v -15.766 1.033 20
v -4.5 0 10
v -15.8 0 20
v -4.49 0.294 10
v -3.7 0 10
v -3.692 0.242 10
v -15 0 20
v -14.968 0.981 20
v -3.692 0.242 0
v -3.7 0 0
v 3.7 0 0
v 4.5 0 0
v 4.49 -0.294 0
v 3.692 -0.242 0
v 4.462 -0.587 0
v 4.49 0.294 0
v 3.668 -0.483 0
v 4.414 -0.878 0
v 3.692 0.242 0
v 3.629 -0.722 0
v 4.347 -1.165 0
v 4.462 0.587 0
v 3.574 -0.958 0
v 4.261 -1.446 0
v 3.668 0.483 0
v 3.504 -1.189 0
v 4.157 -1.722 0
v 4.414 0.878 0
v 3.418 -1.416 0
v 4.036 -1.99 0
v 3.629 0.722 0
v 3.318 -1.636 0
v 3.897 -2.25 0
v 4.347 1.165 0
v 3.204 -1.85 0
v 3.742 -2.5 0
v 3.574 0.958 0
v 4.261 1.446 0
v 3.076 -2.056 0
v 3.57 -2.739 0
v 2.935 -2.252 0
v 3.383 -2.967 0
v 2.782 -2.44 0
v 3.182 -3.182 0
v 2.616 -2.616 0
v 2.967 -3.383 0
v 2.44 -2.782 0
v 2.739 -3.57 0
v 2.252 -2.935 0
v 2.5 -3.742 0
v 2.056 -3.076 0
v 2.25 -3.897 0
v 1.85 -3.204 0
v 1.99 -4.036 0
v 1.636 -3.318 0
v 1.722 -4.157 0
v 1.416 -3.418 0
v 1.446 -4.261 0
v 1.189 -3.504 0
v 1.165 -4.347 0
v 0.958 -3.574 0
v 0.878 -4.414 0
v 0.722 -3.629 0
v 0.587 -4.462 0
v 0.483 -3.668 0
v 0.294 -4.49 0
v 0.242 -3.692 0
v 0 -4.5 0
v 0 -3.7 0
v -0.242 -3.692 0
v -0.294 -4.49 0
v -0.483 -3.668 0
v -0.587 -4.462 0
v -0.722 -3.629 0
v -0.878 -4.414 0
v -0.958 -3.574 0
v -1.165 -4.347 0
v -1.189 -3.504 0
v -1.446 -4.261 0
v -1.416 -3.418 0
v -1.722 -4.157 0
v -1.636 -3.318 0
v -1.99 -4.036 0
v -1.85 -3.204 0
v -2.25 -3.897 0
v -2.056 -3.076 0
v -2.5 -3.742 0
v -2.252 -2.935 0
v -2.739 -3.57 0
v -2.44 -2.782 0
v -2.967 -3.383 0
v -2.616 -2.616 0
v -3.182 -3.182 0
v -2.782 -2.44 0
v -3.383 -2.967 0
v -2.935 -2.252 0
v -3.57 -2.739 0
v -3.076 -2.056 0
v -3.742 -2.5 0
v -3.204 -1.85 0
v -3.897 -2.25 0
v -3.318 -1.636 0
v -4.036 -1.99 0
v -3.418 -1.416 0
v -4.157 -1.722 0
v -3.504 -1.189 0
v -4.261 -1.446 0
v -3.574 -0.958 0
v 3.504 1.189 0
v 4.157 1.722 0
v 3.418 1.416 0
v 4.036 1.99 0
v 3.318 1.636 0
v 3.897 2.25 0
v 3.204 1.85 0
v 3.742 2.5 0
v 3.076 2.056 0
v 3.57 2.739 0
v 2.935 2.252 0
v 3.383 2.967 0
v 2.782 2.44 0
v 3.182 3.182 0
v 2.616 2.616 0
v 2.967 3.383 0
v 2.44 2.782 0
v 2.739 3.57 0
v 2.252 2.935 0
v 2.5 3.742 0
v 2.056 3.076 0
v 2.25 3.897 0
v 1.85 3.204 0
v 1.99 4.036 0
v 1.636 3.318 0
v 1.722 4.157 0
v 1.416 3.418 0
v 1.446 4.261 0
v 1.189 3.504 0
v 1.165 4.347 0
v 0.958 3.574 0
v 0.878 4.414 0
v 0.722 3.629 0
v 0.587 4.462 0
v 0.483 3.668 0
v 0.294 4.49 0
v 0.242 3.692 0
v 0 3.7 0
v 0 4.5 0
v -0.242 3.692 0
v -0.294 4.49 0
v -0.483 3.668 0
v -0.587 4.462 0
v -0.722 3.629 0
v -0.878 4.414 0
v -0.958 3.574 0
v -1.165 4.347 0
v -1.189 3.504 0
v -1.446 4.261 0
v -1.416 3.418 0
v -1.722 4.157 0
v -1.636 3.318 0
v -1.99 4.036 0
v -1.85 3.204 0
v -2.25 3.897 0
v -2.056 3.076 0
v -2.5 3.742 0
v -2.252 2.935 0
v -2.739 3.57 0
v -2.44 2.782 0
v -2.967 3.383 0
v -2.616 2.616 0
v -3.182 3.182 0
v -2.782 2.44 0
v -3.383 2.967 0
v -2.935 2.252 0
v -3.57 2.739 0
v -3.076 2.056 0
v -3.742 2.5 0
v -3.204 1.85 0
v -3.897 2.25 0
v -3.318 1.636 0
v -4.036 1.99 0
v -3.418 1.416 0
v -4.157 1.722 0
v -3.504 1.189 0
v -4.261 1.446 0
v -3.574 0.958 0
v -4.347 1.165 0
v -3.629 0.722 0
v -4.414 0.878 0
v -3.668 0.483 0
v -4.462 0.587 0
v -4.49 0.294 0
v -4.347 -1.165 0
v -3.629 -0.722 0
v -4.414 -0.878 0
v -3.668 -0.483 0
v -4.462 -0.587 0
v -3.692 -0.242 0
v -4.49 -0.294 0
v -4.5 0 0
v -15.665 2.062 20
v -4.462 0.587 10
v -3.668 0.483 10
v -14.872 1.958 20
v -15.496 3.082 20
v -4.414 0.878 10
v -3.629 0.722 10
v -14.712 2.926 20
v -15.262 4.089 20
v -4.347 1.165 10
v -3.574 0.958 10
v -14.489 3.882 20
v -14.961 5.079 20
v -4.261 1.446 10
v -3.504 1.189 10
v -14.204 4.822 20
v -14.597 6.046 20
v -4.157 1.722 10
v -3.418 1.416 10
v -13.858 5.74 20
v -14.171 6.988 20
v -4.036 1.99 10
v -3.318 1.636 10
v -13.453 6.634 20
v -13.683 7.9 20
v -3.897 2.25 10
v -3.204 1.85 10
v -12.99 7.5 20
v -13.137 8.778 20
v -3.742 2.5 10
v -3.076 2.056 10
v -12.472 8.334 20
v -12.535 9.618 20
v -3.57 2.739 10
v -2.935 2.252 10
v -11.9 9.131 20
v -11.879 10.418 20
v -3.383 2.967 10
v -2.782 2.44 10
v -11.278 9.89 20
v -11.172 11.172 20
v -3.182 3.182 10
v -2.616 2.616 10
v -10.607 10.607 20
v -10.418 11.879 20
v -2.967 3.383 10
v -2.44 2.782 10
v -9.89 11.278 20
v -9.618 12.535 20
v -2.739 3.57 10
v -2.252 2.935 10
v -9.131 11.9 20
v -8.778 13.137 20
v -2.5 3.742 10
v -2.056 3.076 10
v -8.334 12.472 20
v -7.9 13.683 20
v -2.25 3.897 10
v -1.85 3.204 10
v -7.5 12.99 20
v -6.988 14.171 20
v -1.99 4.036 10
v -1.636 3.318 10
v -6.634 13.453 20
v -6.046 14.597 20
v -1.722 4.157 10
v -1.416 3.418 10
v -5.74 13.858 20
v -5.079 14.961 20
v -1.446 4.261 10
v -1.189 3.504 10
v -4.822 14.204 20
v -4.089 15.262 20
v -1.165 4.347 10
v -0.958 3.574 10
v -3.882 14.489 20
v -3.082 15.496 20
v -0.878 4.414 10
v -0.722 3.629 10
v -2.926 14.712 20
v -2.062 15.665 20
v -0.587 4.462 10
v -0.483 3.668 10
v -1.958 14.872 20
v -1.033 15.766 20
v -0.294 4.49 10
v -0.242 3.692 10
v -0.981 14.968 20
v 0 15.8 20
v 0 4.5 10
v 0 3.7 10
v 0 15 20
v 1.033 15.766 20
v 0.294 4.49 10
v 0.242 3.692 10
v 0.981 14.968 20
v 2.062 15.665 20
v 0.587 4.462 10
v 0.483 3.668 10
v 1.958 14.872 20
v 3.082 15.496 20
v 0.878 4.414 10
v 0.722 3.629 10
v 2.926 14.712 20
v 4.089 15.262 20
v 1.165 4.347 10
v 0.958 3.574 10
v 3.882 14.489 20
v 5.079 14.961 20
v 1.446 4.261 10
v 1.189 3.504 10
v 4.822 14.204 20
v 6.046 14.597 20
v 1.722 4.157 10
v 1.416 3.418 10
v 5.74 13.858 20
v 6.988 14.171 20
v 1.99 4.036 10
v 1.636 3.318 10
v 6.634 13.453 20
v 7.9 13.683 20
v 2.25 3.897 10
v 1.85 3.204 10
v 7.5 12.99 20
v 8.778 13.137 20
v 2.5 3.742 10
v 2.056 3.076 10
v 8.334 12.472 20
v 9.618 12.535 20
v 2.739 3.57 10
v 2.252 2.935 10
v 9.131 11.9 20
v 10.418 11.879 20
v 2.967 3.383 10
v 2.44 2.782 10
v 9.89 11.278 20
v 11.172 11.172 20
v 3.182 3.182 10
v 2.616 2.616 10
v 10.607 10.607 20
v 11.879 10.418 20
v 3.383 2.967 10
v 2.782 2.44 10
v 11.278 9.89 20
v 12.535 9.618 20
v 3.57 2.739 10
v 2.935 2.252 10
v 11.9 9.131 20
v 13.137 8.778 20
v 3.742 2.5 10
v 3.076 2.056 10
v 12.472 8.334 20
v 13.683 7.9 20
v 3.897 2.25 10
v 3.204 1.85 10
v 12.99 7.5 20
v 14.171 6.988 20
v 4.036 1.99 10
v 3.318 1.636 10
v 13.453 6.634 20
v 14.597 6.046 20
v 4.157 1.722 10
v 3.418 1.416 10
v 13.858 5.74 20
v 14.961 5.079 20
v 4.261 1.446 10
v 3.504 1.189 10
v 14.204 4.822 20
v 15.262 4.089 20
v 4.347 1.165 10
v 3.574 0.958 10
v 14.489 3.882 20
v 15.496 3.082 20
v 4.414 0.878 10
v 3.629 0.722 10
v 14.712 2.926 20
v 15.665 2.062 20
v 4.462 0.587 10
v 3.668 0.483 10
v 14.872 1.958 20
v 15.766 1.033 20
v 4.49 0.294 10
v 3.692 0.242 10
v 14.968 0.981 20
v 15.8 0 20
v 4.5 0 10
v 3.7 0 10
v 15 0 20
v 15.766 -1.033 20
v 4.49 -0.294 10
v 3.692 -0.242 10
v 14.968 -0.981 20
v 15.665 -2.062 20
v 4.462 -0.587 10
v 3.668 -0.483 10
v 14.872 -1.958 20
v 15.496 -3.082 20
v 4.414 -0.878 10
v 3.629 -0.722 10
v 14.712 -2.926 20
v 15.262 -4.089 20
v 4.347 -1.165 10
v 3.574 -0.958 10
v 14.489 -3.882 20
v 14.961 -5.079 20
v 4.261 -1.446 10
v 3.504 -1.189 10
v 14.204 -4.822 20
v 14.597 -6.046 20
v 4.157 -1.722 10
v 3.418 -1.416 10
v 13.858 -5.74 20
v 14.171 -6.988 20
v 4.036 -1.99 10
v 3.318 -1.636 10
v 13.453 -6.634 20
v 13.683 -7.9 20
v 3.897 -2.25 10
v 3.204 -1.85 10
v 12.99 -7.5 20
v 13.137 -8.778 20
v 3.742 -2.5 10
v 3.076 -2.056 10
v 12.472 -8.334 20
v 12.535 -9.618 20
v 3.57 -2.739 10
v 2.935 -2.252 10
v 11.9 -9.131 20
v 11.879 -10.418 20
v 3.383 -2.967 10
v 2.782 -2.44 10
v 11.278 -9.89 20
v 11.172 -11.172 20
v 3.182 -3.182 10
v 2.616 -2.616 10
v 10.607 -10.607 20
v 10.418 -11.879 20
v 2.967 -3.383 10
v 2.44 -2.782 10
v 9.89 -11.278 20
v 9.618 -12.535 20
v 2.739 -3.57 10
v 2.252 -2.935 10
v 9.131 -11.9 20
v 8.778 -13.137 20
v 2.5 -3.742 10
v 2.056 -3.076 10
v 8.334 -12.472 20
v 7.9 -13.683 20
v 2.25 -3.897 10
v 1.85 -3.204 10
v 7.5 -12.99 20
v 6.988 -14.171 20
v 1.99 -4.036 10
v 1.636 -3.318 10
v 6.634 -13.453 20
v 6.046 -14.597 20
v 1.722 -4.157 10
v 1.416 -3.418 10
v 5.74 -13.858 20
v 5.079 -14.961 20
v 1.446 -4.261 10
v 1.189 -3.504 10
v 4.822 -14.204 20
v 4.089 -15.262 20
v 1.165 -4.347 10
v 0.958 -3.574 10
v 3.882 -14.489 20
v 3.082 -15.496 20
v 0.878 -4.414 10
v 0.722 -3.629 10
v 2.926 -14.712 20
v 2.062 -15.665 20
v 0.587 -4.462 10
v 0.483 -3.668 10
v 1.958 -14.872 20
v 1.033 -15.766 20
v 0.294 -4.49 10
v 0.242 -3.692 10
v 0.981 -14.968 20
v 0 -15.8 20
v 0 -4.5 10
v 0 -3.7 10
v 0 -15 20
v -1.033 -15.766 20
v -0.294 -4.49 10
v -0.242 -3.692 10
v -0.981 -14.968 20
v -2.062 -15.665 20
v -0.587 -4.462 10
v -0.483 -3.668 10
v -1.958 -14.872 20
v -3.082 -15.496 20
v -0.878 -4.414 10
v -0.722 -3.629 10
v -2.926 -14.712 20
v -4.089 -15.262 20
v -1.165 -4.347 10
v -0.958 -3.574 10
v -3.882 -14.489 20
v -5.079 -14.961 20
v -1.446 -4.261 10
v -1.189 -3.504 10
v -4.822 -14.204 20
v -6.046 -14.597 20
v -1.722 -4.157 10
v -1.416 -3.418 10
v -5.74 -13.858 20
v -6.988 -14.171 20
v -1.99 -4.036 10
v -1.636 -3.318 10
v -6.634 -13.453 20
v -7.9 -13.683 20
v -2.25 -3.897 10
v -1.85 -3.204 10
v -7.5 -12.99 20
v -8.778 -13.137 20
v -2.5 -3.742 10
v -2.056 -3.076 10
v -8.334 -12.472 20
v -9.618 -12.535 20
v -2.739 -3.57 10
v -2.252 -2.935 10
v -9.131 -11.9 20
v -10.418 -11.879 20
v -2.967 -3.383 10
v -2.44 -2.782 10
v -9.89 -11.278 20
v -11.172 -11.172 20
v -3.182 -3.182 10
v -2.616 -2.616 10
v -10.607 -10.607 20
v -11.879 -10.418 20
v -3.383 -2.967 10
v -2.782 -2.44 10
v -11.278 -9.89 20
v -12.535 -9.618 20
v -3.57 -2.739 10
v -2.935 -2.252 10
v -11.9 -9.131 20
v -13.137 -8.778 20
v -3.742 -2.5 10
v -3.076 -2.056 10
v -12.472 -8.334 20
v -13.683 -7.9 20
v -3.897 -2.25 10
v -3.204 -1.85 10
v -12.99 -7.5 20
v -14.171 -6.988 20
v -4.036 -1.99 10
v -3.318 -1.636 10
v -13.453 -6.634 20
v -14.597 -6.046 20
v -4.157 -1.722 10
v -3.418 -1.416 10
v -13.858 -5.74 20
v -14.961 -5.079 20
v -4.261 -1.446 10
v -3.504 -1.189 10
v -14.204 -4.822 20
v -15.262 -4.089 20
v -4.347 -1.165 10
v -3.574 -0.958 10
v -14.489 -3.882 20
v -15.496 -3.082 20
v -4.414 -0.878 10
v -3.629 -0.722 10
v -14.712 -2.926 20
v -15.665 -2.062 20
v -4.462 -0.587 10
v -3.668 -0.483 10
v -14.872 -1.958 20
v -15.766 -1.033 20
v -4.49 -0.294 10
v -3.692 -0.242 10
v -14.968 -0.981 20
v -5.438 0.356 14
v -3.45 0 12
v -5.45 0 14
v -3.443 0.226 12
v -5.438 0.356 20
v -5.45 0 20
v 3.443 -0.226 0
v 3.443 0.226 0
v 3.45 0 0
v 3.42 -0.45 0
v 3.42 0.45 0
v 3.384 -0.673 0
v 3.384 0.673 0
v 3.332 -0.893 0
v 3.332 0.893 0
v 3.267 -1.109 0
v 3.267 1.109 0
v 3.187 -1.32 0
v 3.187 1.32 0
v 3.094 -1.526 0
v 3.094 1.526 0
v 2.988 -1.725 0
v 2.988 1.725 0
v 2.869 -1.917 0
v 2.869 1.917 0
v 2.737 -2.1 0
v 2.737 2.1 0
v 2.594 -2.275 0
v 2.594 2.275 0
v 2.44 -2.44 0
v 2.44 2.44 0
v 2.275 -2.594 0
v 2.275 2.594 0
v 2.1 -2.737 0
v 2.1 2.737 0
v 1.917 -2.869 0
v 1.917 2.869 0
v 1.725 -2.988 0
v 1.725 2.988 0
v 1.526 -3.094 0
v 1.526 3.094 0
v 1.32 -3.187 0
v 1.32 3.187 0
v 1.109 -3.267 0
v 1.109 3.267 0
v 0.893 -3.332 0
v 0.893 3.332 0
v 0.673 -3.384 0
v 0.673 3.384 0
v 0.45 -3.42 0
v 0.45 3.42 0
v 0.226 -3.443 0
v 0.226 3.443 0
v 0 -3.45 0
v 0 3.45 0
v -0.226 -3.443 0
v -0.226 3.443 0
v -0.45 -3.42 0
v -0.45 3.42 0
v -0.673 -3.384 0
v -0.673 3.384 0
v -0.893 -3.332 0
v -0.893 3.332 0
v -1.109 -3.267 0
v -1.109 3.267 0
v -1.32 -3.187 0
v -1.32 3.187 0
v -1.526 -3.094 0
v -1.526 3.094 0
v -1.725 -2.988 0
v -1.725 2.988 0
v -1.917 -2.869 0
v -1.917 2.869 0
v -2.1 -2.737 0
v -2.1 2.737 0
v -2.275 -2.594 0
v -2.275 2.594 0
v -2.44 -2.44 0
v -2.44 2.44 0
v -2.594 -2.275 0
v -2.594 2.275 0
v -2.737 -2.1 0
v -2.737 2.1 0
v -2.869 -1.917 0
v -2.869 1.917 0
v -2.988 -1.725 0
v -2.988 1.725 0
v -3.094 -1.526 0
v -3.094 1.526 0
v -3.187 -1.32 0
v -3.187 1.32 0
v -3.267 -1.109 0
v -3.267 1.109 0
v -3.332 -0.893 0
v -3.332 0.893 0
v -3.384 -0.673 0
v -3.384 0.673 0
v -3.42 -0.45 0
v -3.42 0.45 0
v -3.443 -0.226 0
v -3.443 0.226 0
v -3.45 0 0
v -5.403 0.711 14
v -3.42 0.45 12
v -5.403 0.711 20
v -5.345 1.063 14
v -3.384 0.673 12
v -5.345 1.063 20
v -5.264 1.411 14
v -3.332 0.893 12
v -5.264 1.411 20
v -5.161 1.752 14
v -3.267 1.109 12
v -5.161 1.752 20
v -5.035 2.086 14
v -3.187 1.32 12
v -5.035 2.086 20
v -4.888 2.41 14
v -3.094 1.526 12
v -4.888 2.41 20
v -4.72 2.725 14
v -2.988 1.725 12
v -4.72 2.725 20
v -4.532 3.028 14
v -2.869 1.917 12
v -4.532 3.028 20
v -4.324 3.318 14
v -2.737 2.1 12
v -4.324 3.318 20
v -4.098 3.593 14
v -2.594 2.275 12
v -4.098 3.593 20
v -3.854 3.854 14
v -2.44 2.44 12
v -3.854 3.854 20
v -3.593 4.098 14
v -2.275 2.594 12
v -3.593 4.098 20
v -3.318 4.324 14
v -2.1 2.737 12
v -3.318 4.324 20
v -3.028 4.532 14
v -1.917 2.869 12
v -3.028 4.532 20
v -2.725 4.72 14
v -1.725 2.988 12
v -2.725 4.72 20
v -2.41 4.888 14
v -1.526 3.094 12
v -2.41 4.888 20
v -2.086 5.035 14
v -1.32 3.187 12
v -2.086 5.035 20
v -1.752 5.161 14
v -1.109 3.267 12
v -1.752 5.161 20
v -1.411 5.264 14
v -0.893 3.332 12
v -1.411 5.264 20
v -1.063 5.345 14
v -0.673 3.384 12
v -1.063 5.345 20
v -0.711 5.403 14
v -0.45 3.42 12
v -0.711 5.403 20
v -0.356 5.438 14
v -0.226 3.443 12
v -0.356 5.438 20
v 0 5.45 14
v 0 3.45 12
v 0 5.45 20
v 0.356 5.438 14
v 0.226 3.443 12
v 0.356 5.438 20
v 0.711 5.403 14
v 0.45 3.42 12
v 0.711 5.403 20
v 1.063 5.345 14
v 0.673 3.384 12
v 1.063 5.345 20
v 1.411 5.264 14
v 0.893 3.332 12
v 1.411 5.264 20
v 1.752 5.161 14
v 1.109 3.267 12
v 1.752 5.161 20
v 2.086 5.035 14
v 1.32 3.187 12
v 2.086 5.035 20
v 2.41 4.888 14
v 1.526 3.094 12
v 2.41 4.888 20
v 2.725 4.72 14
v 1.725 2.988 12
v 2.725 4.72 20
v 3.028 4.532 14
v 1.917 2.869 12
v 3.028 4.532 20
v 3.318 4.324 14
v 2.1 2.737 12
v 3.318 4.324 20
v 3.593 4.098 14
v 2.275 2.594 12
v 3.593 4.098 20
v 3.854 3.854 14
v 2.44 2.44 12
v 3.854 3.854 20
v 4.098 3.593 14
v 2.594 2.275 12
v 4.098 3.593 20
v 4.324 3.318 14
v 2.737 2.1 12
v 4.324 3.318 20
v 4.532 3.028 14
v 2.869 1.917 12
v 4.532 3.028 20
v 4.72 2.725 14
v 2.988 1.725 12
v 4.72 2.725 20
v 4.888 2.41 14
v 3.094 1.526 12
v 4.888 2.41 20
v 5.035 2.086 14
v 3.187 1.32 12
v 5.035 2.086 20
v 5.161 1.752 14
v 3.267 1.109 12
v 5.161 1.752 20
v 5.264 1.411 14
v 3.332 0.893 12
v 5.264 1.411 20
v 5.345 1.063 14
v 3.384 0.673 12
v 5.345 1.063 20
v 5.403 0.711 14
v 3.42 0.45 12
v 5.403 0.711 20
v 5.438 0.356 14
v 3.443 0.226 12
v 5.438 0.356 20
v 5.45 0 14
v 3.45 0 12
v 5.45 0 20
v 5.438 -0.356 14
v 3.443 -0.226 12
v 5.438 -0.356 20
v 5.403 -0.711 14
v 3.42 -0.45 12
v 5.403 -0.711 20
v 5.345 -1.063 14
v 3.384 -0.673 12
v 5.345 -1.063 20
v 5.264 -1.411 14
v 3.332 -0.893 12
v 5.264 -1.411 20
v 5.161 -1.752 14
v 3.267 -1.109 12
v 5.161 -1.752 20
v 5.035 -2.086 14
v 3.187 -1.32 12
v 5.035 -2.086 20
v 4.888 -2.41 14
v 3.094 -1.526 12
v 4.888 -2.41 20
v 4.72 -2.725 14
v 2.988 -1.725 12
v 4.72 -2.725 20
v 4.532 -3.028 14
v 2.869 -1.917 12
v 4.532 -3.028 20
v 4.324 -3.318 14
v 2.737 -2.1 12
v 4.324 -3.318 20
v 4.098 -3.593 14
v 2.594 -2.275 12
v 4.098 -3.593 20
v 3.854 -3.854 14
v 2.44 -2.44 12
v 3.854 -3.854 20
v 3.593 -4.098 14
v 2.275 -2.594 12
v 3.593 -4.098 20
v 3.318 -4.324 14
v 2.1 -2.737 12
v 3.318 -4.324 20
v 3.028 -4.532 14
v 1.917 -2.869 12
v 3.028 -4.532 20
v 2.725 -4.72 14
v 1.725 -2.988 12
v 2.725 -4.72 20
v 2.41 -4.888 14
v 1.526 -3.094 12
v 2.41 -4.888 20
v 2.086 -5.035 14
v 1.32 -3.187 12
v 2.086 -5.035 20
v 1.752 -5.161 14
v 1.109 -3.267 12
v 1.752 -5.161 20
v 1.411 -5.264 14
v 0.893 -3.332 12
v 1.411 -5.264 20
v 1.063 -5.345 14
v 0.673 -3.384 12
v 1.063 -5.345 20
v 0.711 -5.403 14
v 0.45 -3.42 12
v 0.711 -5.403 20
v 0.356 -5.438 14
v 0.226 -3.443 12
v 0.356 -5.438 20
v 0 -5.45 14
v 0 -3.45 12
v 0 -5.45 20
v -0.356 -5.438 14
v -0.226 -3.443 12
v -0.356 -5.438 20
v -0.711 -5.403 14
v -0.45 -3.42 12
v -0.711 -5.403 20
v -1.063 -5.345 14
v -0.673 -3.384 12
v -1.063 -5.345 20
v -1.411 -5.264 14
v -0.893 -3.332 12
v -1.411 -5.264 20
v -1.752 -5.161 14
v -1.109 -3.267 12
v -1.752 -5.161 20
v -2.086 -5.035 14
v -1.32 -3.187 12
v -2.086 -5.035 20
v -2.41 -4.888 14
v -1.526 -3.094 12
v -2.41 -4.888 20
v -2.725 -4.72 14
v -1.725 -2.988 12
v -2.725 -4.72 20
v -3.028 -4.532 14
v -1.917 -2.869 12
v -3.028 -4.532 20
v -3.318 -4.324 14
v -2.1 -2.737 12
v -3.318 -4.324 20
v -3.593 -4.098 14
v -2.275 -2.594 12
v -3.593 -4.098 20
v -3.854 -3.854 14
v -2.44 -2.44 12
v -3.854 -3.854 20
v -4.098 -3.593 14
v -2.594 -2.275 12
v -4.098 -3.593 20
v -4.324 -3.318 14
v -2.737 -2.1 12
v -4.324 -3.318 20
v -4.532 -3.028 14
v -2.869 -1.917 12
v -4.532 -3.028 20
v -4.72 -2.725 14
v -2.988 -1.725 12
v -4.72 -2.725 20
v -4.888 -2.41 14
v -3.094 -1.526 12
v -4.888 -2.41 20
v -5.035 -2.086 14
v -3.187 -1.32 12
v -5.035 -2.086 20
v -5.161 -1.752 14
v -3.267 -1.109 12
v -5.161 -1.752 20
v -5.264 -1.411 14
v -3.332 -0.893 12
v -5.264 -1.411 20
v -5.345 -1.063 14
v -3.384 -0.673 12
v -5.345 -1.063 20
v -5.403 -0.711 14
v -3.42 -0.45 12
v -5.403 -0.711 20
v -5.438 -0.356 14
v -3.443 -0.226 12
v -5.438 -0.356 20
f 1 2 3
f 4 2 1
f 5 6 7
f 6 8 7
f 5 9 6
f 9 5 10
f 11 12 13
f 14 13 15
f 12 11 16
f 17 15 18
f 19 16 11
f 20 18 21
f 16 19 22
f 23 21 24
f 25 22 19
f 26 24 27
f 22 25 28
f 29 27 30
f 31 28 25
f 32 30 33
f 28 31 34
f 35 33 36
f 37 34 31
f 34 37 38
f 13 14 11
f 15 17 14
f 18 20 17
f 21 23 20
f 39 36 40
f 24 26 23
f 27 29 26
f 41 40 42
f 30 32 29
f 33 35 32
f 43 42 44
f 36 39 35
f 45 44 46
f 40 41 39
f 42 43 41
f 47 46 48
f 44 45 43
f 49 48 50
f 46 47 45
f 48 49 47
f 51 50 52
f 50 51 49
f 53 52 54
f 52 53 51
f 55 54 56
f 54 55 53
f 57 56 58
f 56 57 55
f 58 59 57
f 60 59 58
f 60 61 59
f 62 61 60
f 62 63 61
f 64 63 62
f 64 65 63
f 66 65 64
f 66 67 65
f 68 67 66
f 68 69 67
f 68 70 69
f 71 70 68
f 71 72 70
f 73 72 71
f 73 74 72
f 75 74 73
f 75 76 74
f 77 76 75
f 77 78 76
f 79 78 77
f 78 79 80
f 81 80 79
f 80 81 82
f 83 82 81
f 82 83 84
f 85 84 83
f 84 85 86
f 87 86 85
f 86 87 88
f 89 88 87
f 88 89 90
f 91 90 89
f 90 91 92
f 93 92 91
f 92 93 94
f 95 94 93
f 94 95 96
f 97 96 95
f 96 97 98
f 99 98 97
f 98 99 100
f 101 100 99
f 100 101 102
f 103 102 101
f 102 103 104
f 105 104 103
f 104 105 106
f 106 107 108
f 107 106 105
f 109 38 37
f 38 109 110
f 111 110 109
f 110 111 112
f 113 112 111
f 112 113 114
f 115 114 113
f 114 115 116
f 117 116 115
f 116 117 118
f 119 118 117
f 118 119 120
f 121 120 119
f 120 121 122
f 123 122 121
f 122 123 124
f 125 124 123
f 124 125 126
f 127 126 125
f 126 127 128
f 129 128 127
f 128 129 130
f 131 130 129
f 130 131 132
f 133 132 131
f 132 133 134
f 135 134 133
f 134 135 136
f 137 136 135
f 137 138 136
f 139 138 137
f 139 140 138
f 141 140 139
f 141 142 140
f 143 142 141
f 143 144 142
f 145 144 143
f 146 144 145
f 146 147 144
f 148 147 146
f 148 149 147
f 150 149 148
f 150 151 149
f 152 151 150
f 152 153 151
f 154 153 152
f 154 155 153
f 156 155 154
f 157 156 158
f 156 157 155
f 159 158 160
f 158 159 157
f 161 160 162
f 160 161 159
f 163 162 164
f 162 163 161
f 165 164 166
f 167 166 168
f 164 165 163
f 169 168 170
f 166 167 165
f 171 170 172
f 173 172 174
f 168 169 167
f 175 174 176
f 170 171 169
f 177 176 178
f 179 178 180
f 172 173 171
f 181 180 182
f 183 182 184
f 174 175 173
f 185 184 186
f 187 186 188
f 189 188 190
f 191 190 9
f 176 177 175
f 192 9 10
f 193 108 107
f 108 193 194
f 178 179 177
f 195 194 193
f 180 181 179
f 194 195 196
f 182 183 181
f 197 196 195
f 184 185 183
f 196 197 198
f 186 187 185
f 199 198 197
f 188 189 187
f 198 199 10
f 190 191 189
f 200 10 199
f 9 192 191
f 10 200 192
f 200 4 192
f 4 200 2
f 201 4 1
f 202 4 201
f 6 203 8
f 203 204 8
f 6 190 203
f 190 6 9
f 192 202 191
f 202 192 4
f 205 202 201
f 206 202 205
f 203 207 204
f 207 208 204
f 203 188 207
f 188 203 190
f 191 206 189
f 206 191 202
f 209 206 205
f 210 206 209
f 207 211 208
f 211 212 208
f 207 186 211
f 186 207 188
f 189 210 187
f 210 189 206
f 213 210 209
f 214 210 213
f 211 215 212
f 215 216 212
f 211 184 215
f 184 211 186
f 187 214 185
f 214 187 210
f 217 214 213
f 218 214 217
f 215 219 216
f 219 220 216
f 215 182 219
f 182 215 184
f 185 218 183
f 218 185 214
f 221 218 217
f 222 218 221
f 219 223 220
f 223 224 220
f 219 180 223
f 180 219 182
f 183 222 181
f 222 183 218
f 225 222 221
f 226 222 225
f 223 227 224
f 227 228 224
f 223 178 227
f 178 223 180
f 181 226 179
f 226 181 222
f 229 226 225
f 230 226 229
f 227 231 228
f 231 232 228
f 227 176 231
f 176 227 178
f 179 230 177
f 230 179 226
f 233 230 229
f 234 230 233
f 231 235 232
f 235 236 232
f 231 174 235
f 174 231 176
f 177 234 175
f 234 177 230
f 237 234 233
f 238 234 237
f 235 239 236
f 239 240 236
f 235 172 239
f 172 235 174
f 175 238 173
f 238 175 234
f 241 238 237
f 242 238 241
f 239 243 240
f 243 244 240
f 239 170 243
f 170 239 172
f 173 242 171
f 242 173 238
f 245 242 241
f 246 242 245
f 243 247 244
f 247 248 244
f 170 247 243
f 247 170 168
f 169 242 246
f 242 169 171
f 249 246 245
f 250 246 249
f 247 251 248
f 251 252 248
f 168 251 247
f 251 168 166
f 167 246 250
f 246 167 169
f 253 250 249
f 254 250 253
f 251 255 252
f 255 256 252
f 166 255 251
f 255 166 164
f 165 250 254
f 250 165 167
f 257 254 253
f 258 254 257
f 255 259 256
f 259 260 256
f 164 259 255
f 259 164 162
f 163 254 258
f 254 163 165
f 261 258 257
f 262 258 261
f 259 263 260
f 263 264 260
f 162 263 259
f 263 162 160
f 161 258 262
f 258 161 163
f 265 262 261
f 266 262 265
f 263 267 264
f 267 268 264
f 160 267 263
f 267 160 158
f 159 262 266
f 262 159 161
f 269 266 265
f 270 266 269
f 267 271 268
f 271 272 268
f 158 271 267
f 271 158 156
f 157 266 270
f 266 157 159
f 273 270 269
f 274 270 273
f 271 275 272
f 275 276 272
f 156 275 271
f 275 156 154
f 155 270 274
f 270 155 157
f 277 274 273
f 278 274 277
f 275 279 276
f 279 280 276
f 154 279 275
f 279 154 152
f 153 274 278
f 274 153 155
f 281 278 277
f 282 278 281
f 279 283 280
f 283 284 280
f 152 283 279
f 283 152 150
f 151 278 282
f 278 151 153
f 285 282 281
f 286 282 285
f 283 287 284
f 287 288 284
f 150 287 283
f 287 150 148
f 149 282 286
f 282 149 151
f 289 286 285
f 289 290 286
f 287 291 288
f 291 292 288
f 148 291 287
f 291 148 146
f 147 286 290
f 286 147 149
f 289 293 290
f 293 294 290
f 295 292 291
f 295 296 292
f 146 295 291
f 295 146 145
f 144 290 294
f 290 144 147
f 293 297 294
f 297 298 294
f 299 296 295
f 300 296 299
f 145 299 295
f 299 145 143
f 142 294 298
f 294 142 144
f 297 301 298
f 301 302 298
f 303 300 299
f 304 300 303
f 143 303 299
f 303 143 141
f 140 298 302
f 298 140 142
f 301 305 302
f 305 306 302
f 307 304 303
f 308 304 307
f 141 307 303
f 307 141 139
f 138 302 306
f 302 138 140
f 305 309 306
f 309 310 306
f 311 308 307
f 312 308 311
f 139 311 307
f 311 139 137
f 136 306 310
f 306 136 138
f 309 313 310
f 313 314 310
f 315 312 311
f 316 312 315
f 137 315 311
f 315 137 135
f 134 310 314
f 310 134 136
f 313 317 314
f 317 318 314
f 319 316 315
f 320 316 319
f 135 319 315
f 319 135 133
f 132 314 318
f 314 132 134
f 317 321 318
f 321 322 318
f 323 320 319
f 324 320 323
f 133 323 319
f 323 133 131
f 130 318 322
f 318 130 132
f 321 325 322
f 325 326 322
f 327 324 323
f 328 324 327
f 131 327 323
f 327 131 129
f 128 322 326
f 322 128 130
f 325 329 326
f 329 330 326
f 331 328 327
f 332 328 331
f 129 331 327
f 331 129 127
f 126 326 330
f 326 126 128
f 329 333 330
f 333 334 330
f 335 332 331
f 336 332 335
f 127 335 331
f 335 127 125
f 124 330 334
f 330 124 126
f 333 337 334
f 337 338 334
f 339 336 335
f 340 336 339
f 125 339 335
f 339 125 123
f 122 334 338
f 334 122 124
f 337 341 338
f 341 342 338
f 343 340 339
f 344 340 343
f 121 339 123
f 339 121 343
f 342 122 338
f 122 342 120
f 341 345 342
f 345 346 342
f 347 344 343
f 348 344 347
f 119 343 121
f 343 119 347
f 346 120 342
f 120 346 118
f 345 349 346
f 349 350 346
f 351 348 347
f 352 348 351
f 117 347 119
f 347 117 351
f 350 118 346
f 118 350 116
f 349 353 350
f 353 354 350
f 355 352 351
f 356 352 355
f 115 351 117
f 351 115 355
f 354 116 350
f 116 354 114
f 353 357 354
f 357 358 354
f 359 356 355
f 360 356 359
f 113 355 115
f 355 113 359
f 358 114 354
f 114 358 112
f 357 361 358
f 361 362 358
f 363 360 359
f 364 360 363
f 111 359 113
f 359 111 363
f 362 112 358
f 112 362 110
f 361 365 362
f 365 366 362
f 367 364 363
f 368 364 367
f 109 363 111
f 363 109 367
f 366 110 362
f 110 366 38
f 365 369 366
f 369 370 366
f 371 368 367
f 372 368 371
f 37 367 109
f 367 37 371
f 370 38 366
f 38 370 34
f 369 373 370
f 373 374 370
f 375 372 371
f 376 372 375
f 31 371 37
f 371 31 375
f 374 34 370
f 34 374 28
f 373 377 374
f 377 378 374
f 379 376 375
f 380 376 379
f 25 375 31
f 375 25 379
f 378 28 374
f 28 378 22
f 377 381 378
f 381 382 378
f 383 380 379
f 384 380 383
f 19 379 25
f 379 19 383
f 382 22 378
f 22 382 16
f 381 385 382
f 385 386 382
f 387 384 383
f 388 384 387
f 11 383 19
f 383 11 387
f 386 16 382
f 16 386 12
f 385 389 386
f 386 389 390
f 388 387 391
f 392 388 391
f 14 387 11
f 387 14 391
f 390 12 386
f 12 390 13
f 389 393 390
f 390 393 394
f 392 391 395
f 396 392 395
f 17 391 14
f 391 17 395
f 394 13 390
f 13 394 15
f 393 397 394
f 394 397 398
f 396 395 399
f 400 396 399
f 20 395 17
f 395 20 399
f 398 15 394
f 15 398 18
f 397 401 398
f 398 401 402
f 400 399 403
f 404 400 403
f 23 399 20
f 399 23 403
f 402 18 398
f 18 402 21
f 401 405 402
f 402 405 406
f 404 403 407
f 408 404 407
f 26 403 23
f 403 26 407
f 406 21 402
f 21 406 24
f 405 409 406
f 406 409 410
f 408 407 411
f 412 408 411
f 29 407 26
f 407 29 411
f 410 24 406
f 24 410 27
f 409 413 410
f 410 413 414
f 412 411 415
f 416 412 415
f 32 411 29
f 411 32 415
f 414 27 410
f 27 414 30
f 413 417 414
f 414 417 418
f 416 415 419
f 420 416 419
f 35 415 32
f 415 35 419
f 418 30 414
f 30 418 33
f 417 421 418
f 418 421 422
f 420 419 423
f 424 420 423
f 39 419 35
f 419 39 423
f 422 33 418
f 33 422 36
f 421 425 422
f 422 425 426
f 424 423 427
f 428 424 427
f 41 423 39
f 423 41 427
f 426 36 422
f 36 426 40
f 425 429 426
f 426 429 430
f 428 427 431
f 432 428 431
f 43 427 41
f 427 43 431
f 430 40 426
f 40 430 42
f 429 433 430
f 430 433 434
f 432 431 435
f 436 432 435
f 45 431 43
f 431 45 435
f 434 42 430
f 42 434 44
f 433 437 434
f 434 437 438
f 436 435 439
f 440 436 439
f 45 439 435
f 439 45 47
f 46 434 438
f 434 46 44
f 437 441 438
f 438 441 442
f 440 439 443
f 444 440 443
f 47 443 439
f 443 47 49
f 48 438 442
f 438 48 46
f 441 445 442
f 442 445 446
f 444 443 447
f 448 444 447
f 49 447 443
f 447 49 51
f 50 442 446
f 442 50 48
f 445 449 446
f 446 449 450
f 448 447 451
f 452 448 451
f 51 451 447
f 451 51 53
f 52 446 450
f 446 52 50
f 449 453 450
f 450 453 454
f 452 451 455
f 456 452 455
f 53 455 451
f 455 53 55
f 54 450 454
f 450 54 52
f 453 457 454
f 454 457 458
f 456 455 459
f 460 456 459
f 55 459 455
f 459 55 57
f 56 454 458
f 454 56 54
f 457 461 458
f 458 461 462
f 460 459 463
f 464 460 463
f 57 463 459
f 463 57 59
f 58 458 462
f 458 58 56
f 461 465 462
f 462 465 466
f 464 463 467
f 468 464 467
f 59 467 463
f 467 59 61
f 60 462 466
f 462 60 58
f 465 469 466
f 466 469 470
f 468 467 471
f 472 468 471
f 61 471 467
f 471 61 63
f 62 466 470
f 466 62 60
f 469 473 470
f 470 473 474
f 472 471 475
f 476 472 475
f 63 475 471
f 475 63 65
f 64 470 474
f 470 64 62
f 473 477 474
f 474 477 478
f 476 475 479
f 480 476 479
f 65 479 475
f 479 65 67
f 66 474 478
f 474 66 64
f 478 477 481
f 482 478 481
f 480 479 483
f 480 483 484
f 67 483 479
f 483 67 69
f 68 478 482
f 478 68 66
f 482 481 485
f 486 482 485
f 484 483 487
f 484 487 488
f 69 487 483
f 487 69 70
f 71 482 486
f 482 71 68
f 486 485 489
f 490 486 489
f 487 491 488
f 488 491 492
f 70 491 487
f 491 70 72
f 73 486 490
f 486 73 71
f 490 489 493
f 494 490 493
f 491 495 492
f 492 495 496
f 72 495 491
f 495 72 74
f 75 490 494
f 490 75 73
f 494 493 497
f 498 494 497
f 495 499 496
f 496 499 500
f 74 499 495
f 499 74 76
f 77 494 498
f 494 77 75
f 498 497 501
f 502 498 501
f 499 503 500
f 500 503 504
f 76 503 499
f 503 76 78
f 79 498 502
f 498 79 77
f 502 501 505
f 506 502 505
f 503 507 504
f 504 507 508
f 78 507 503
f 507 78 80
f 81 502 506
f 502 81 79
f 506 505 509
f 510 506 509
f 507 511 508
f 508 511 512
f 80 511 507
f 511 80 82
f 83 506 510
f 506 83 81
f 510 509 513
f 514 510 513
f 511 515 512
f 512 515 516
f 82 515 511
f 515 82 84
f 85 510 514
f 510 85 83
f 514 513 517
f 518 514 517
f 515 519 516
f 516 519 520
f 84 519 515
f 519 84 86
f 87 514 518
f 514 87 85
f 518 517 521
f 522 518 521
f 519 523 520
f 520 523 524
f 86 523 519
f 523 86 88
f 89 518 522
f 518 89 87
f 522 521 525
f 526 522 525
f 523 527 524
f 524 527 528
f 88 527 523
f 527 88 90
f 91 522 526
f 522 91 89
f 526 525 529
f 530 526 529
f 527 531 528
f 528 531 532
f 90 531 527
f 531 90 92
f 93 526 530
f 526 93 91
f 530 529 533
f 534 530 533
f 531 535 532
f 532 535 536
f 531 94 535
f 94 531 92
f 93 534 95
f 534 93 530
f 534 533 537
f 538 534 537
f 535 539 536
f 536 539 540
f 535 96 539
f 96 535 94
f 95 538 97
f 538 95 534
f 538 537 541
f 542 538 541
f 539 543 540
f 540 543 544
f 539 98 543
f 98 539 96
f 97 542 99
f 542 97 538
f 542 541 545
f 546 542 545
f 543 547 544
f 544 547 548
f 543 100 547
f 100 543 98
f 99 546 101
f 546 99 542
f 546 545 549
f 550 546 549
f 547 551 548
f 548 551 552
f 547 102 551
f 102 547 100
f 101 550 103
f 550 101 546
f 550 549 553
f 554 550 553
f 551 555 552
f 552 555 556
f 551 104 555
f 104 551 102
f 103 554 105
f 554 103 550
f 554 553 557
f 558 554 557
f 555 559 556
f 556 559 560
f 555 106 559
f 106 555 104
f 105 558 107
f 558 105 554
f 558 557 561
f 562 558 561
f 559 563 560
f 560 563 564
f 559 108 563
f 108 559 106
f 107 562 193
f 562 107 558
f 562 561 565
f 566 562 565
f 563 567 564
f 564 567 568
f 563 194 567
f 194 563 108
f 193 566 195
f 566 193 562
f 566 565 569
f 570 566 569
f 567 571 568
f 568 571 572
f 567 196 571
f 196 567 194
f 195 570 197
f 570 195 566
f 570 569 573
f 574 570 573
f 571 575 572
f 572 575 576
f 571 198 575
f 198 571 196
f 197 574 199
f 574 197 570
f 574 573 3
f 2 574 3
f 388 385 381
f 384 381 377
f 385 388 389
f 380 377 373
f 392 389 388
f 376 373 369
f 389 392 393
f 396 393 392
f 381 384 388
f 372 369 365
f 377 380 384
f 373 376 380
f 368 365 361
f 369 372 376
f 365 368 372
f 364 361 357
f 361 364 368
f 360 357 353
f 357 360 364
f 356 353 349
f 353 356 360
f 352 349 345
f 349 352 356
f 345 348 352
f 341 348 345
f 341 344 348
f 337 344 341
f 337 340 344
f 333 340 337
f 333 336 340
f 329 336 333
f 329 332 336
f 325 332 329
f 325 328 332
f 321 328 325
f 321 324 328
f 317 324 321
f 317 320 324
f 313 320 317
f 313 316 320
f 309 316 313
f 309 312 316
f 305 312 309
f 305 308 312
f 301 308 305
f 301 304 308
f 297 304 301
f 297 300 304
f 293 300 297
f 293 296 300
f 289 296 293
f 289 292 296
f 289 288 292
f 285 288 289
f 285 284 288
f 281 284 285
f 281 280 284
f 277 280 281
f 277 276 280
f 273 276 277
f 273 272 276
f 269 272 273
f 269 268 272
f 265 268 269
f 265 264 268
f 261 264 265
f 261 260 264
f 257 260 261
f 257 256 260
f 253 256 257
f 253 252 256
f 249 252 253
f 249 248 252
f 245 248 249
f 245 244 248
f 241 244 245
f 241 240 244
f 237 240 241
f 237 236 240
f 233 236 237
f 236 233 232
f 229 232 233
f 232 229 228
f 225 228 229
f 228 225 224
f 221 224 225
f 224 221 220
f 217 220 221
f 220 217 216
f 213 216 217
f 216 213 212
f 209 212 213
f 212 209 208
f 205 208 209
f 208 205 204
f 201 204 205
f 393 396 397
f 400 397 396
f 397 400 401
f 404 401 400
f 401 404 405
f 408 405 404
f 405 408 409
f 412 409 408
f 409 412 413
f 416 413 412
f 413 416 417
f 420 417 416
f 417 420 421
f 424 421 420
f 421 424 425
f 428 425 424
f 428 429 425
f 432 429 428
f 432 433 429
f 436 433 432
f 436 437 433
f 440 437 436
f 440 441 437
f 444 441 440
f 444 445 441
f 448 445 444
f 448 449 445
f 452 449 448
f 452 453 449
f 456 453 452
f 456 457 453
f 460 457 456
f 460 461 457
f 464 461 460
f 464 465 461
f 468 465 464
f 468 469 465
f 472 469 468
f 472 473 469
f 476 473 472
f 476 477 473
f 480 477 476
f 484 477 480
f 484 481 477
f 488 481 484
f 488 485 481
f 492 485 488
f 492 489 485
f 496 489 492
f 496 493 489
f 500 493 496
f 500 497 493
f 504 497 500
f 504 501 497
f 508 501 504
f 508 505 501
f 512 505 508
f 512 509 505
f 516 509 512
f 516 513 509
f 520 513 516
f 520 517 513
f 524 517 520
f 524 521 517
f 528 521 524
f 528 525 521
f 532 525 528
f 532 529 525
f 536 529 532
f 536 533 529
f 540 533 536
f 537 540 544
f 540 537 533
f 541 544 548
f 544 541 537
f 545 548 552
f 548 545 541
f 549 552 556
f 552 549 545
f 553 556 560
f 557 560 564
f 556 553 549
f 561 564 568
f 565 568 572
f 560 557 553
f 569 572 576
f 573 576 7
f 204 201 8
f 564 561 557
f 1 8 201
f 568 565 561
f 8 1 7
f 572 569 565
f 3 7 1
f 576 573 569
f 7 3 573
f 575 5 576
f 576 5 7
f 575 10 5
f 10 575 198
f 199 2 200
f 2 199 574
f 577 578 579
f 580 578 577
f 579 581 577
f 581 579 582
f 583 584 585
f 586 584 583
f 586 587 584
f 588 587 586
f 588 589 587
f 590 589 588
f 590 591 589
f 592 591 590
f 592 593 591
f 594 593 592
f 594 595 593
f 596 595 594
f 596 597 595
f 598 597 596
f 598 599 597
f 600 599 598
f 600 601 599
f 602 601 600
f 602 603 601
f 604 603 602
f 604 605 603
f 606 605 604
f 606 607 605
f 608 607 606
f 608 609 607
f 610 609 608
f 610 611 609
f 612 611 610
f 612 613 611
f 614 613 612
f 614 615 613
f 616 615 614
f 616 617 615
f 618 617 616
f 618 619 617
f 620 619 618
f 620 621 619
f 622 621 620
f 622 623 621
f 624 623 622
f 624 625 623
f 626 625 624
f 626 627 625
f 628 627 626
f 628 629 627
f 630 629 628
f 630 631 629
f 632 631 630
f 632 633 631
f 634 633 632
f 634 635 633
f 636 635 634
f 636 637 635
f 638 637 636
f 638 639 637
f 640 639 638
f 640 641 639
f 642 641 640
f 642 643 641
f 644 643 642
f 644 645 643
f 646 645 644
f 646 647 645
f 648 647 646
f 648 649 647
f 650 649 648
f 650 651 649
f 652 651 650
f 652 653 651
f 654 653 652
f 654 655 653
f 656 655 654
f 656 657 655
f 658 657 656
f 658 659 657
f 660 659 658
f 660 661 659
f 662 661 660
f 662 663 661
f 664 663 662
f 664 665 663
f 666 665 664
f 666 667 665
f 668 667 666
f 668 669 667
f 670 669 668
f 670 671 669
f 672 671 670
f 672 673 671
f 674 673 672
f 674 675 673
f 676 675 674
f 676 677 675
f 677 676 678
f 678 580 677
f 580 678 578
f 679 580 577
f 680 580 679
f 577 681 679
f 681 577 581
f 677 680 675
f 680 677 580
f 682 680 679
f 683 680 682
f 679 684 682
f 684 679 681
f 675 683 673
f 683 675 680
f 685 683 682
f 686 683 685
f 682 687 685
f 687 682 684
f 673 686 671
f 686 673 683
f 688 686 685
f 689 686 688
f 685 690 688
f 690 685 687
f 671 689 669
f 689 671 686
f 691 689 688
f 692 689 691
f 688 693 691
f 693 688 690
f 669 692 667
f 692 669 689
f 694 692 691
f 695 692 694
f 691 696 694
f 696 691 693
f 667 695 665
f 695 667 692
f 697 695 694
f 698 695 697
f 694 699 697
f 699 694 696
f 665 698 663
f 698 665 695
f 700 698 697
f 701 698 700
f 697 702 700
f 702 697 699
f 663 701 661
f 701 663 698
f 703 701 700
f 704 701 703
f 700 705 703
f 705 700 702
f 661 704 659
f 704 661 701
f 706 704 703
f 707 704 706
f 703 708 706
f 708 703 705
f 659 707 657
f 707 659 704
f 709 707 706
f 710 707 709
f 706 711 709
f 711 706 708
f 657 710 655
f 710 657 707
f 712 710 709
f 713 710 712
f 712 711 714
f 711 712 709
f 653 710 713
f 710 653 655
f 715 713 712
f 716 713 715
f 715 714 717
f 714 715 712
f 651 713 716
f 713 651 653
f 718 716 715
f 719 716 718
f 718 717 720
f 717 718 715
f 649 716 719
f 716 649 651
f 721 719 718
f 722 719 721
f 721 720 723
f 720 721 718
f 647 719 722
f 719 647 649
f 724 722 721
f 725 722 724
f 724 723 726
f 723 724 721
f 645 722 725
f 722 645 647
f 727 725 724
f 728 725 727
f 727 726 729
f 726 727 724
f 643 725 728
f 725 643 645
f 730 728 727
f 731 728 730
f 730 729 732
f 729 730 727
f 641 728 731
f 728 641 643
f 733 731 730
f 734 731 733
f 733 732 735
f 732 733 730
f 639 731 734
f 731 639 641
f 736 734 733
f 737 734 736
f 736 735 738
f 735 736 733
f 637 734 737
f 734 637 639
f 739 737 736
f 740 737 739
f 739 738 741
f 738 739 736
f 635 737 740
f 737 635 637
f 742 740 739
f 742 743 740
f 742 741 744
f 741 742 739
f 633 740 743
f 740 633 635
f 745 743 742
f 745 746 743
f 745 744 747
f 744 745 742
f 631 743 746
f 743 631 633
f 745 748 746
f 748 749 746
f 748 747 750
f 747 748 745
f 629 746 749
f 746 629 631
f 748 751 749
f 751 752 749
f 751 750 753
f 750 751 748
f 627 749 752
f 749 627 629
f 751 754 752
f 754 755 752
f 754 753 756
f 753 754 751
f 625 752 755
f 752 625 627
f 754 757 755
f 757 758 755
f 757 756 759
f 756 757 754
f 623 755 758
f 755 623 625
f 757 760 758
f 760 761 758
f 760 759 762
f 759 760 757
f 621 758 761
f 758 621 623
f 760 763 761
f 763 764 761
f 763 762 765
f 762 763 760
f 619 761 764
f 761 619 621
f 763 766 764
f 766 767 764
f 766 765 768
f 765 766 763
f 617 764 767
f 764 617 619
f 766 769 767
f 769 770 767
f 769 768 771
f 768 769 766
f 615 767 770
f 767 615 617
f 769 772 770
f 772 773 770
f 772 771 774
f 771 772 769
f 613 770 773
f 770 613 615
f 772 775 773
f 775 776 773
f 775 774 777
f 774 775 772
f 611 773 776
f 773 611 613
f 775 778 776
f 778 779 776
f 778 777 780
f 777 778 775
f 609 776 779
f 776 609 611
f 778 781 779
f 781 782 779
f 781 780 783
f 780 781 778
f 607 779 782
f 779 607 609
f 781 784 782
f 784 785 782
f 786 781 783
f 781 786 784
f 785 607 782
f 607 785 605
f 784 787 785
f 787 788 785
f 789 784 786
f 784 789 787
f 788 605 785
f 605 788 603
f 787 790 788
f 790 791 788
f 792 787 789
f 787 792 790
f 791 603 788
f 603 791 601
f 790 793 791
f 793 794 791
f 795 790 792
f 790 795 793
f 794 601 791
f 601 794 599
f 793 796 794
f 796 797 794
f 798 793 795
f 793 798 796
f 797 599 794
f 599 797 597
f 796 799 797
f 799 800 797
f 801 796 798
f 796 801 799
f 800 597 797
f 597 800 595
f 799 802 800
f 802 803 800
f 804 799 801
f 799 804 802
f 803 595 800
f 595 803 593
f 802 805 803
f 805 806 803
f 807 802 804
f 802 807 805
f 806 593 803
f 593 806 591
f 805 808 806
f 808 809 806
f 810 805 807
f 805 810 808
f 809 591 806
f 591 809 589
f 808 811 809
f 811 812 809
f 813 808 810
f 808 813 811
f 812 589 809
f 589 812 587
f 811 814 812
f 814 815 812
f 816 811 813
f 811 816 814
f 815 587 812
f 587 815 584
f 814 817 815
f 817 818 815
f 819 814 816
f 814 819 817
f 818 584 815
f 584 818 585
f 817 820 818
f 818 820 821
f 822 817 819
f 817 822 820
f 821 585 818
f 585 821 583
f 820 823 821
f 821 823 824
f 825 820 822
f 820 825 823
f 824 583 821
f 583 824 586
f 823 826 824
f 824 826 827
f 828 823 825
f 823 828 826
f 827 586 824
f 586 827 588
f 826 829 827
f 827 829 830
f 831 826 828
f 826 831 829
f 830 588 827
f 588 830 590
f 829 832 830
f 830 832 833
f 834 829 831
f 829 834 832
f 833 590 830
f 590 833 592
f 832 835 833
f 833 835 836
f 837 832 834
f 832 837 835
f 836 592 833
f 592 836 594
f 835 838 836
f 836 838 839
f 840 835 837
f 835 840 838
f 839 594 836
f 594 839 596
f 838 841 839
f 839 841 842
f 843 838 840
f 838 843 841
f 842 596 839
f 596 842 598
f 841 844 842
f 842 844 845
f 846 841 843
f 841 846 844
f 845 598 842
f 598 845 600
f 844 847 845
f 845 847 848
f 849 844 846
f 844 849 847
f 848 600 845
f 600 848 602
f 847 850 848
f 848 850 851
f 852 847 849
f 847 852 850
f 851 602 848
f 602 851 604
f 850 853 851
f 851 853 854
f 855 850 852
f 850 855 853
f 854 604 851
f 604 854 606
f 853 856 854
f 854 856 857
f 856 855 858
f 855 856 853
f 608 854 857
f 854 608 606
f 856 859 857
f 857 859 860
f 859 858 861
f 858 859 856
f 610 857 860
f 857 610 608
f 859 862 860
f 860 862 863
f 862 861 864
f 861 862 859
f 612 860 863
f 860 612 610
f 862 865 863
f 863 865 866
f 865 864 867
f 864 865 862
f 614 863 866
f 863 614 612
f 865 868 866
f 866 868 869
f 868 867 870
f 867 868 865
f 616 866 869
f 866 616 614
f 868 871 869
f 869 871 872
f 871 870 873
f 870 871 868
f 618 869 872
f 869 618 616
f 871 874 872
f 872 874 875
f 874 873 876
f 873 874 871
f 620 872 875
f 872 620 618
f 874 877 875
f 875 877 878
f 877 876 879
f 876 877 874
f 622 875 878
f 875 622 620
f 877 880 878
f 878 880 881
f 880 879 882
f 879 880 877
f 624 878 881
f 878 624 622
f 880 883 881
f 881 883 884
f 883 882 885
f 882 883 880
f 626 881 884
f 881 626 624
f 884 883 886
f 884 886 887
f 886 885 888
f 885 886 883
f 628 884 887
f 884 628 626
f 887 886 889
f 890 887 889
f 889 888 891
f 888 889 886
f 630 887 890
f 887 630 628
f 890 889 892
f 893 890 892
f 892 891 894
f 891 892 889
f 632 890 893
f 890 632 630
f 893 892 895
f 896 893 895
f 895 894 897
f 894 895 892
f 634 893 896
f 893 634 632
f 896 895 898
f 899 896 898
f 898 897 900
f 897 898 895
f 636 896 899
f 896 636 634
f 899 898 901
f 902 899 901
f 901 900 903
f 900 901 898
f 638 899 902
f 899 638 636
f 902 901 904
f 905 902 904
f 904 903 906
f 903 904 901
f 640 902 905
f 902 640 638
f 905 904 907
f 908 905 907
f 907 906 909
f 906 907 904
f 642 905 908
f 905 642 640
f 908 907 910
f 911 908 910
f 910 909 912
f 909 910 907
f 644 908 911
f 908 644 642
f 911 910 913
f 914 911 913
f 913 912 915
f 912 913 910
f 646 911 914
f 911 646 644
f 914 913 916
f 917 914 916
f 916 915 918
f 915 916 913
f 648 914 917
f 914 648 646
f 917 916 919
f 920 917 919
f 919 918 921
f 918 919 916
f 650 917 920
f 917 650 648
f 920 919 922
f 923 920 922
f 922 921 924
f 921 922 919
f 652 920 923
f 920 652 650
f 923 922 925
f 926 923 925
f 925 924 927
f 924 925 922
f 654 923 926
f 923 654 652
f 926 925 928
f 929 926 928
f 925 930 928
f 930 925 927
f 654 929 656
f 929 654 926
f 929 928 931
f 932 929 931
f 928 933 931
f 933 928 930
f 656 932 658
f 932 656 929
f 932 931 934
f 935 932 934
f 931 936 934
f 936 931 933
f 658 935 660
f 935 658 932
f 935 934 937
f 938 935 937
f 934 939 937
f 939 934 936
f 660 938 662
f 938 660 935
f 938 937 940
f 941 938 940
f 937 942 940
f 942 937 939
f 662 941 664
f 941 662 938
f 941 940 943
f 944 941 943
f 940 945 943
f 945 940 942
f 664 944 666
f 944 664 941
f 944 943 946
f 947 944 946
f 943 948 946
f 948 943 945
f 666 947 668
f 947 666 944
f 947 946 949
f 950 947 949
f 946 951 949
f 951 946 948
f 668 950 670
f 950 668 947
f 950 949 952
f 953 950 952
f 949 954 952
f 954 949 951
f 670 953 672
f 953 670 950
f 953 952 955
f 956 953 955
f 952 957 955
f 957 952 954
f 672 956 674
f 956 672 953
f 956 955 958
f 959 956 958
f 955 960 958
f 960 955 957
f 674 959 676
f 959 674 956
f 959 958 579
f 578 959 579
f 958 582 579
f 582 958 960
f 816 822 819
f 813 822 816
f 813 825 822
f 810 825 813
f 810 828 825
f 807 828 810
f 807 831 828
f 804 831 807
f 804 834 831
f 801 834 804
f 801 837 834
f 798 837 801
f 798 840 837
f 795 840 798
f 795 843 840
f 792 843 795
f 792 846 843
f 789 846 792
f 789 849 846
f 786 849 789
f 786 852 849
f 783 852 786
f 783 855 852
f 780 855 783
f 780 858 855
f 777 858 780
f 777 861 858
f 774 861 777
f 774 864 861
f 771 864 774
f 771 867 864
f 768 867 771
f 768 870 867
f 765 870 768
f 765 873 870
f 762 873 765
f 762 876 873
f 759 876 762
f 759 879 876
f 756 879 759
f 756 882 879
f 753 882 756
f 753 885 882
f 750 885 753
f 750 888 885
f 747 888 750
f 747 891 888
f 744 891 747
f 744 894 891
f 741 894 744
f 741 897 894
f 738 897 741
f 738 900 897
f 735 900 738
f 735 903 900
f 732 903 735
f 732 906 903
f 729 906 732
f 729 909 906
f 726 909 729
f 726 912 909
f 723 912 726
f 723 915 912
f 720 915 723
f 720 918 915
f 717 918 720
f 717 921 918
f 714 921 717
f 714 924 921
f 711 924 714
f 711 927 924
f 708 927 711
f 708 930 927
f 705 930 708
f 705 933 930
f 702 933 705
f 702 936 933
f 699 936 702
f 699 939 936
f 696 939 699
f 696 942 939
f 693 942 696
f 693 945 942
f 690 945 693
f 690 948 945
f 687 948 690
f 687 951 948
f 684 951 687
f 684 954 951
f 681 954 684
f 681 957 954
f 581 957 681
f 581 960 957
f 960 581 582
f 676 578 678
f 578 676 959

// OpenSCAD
/*

_____________________
\                   /
 \                 /
  \               /
   \             /
    |           |
    |           |
    |___________|


*/


thickness = 2;

d1_i=70;
d2_o=30;
d3_o=27;
h1=30;
h2=20;

d2_i=d2_o-2*thickness;
d3_i=d3_o-2*thickness;

fn=8;

// funnel(thickness=thickness,d1_i=d1_i,d2_i=d2_i,d3_i=d3_i,h1=h1,h2=h2,fn=fn);

res = 96;
// vapo
vap_t=0.8;
vap_inner_d = 9;
vap_h=10;
funnel(
  thickness=vap_t,
  d1_i=30,
  d2_i=vap_inner_d-2*vap_t,
  d3_i=vap_inner_d-2*vap_t,
  h1=vap_h,
  h2=vap_h,
  fn=res
);


stamp_r=(vap_inner_d-2*vap_t-0.5)/2;
// cylinder(d=9-2*vap_t-0.5,h=20,$fn=res);
rotate_extrude($fn=res)

  polygon(points=
  [
    [0,0],
    [0,vap_h*2],
    [stamp_r+2,vap_h*2],
    [stamp_r+2,vap_h*2-6],
    [stamp_r,vap_h*2-8],
    [stamp_r,0]
  ]);


module funnel(thickness=thickness,d1_i=d1_i,d2_i=d2_i,d3_i=d3_i,h1=h1,h2=h2,fn=fn){
  h_max = h1+h2;

  r1_i=d1_i/2;
  r2_i=d2_i/2;
  r3_i=d3_i/2;

  r1=r1_i+thickness;
  r2=r2_i+thickness;
  r3=r3_i+thickness;

rotate_extrude($fn=fn)

  polygon(points=
  [
    [r3_i,0],
    [r2_i,h2],
    [r1_i,h_max],
    [r1,h_max],
    [r2,h2],
    [r3,0],
  ]);
}
